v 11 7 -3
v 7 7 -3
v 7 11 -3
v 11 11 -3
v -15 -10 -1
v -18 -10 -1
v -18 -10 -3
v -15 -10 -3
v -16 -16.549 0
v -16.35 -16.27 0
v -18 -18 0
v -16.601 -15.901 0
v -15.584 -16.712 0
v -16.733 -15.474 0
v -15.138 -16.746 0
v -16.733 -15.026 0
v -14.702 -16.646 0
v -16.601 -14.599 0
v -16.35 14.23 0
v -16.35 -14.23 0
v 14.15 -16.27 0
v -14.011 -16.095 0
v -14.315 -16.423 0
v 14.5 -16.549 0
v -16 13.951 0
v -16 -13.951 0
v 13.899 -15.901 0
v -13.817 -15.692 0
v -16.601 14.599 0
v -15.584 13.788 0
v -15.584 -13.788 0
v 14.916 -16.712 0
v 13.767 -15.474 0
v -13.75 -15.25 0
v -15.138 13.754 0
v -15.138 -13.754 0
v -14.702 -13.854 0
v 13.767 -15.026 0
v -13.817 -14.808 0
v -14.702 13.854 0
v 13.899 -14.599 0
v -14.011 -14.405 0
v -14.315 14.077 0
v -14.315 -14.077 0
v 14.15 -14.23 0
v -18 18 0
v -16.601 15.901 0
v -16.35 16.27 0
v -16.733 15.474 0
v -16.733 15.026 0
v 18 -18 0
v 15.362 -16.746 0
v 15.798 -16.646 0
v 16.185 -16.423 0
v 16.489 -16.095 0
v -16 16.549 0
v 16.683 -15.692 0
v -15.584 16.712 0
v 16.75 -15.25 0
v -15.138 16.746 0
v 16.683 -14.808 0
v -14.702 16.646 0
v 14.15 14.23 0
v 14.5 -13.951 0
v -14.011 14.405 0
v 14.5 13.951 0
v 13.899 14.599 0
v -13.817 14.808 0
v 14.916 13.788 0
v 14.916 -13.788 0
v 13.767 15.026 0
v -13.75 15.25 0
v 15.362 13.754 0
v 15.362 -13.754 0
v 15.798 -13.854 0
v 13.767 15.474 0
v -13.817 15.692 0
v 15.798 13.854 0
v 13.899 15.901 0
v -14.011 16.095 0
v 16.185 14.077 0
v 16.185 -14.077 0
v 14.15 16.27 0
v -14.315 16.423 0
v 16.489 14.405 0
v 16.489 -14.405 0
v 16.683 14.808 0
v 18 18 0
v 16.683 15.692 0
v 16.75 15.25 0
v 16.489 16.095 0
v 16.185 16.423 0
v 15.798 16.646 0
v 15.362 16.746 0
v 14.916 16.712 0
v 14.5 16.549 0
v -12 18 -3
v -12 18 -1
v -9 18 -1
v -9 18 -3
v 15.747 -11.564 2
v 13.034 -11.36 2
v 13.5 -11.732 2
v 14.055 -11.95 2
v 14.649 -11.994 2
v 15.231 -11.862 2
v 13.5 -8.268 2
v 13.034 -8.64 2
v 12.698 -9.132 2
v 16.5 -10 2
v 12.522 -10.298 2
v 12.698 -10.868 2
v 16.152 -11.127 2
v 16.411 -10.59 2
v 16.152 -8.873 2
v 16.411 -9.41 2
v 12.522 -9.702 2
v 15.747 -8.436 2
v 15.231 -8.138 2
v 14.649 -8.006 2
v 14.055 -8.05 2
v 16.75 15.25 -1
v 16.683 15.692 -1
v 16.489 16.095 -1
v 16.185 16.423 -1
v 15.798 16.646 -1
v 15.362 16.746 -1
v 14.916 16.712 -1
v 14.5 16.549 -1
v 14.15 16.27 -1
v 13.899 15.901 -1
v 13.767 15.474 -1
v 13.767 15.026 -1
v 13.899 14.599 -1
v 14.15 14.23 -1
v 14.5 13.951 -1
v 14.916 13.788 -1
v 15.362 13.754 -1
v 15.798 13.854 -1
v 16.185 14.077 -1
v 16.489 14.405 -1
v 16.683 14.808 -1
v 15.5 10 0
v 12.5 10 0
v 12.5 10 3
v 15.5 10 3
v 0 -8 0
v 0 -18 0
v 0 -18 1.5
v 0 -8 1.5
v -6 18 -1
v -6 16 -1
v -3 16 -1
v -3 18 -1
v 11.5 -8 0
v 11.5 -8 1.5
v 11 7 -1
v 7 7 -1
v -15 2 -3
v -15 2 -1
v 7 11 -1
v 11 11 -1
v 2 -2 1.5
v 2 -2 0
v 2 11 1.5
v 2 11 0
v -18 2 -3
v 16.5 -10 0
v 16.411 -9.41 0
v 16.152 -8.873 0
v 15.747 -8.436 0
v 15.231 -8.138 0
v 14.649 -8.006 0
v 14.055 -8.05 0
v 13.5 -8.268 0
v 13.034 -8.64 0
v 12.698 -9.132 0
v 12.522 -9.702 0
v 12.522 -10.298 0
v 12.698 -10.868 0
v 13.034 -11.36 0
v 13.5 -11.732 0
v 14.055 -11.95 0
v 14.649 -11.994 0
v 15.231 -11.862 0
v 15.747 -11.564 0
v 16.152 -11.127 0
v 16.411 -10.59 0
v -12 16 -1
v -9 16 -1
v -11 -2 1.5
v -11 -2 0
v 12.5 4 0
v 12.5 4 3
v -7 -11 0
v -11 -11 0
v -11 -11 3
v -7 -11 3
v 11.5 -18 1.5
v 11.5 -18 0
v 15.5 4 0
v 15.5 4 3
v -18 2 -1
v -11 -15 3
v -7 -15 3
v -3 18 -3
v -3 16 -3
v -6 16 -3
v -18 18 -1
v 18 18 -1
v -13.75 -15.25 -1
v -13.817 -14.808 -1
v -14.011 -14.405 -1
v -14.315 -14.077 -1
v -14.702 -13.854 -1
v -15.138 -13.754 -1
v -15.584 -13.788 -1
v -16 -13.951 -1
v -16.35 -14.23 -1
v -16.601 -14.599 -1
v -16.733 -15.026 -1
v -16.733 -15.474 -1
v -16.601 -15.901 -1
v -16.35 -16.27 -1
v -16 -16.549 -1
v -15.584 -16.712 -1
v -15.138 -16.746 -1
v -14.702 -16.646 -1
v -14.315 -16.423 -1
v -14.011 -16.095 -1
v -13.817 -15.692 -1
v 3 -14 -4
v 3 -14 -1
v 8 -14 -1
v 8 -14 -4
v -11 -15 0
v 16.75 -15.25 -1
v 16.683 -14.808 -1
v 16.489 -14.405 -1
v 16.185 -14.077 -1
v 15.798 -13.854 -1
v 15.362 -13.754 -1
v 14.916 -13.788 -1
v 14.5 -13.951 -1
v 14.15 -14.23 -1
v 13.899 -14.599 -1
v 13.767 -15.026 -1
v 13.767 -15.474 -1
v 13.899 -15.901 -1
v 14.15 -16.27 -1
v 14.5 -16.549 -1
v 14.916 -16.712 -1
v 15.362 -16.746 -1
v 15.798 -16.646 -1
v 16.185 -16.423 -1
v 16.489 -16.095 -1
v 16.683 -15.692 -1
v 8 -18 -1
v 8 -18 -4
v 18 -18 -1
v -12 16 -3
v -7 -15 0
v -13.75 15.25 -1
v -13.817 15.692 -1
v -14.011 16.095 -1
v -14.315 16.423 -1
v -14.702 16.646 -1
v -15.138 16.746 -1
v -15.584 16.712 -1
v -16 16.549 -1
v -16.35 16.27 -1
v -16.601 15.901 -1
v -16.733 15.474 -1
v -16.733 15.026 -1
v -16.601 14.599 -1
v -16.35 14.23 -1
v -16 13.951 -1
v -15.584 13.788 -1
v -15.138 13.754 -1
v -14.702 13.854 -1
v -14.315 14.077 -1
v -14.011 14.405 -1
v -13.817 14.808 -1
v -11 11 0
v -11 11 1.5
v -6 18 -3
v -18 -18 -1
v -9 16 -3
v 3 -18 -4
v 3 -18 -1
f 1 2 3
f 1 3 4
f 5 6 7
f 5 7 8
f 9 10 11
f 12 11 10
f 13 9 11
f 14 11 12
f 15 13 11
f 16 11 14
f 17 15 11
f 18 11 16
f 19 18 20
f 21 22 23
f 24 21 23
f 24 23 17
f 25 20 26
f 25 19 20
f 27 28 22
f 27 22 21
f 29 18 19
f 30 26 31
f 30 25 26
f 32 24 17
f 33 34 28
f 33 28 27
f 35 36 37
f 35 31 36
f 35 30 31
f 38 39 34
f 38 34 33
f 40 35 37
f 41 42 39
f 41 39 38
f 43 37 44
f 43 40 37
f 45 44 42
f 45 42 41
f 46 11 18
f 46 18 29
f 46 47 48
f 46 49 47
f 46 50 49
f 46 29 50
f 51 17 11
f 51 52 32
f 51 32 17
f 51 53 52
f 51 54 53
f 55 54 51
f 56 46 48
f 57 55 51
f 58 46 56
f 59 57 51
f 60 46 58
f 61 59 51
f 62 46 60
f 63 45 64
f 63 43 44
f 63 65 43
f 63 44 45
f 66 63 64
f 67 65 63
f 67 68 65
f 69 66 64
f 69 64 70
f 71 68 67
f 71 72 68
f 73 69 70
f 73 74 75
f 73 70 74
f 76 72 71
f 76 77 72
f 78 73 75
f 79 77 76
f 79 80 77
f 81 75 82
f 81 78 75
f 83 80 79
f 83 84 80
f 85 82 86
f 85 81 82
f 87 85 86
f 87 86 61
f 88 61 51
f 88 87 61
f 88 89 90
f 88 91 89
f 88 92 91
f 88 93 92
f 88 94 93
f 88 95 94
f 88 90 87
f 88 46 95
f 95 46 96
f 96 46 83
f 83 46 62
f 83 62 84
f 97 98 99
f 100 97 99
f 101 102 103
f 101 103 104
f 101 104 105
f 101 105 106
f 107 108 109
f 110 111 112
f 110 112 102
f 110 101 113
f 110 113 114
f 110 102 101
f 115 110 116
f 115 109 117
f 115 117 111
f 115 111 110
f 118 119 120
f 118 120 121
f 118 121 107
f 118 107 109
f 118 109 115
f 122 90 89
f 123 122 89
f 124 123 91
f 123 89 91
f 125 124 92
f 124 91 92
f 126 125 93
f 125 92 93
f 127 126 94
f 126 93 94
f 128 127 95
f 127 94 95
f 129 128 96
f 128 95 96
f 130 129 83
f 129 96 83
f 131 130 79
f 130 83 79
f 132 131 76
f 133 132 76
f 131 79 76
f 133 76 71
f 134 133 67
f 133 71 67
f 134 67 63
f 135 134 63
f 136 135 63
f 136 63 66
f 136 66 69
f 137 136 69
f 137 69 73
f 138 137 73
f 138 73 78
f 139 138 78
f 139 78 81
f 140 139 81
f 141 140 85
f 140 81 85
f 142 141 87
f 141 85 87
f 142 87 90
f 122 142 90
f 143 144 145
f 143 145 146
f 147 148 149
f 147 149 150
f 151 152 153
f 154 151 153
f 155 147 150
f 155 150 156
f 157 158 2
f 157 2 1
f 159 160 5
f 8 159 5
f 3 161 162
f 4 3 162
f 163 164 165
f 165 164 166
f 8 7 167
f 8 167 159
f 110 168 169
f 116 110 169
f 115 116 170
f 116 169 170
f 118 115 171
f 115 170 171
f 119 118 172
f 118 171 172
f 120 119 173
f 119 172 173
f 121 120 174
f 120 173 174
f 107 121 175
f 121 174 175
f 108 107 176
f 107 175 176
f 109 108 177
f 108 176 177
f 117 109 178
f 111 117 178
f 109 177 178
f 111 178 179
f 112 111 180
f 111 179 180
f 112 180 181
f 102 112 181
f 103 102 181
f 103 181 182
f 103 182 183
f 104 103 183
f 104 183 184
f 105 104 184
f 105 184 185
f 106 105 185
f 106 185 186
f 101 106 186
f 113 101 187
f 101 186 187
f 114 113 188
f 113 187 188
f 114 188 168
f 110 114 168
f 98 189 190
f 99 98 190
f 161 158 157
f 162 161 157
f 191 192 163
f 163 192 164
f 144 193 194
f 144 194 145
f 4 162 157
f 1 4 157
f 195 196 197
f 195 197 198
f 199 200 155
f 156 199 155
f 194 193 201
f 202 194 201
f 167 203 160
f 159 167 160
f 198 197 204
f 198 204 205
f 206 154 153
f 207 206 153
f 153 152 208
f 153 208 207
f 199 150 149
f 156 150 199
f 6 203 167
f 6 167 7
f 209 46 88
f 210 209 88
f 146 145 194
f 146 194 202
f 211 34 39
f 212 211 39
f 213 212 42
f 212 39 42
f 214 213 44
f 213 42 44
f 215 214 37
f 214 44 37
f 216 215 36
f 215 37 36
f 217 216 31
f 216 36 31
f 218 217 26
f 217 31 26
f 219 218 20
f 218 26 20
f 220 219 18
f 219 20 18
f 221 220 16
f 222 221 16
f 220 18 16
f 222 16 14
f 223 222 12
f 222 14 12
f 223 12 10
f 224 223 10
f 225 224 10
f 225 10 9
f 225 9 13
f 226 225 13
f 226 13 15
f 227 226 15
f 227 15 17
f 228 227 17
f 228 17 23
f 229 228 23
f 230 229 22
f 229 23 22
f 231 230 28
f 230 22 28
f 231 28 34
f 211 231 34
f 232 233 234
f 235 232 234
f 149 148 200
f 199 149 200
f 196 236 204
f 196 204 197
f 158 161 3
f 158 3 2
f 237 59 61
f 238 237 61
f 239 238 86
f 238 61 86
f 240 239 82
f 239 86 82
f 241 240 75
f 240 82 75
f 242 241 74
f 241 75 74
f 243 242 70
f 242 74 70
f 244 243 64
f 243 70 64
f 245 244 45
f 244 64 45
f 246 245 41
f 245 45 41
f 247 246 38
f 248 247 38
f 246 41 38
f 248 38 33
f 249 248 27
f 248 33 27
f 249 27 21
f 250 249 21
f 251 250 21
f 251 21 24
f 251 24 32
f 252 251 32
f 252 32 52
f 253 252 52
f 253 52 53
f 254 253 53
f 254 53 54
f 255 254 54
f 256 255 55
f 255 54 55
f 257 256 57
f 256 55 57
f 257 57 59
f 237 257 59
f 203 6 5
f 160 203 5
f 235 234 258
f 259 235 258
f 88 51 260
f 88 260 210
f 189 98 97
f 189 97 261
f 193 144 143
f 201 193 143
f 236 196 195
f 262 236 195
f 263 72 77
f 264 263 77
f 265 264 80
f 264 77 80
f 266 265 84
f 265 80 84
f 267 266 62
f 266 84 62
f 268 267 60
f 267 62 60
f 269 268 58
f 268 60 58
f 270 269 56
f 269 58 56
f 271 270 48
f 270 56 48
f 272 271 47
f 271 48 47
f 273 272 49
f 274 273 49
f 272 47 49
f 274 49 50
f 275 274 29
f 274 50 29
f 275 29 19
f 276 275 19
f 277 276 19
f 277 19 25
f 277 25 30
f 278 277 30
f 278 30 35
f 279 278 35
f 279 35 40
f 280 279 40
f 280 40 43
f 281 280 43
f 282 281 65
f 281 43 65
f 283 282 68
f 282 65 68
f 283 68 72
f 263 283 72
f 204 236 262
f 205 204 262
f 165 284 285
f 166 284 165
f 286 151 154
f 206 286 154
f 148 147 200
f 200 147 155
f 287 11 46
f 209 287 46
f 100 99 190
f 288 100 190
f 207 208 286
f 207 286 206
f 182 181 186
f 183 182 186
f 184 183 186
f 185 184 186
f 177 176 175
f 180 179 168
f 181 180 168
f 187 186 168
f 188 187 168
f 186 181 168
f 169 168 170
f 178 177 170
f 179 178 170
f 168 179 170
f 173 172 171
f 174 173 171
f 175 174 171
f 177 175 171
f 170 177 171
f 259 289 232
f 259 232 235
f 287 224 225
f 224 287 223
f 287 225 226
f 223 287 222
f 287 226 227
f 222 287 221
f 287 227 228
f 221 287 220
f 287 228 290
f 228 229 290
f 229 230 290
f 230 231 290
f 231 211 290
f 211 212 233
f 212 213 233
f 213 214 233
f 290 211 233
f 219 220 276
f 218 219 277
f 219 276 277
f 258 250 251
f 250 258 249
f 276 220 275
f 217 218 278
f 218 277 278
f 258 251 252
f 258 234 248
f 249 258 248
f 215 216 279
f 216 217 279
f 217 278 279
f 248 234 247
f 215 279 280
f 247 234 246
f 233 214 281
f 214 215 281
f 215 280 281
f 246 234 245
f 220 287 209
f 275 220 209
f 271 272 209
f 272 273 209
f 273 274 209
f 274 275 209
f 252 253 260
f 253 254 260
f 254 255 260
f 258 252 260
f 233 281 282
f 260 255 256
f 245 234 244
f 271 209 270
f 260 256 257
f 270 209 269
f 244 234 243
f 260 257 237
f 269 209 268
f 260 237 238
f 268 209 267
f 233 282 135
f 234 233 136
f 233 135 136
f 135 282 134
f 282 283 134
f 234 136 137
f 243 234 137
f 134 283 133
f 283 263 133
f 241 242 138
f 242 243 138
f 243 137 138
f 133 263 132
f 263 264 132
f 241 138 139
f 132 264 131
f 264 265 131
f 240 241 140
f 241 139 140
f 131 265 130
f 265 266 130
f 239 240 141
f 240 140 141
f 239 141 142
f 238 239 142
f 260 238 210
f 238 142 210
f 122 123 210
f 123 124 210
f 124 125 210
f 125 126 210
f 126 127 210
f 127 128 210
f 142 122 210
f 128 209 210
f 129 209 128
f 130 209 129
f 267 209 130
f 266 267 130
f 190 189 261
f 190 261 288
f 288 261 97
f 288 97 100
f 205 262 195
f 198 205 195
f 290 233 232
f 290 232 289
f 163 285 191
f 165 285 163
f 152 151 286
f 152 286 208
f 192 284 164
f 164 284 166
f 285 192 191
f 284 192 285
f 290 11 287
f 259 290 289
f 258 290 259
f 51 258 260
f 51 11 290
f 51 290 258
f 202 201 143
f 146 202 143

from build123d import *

# Parameters (mm, degrees)
F1_W     = 13
F1_H     = 13
F1_W_2   = 11.5
F1_H_2   = 10
F2_DEPTH = 1.5
F1_R     = 2
F3_DEPTH = 2
F1_W_3   = 3
F1_H_3   = 6
F1_W_4   = 4
F1_H_4   = 4
F4_DEPTH = 3
F0_W     = 36
F0_H     = 36
F0_R     = 1.5
F5_DEPTH = 1
F6_W     = 3
F6_H     = 2
F6_W_2   = 4
F6_H_2   = 4
F6_H_3   = 12
F7_DEPTH = 2
F6_W_3   = 5
F8_DEPTH = 3


with BuildPart() as f2:
    # F1 (on face) → F2 (new body)
    with BuildSketch(Plane.XY):
        with Locations((-4.5, 4.5)):
            Rectangle(F1_W, F1_H)
        with Locations((5.75, -13)):
            Rectangle(F1_W_2, F1_H_2)
    extrude(amount=F2_DEPTH)


with BuildPart() as f3:
    # F1 (on face) → F3 (new body)
    with BuildSketch(Plane.XY):
        with Locations((14.5, -10)):
            Circle(F1_R)
    extrude(amount=F3_DEPTH)


with BuildPart() as f4:
    # F1 (on face) → F4 (new body)
    with BuildSketch(Plane.XY):
        with Locations((14, 7)):
            Rectangle(F1_W_3, F1_H_3)
        with Locations((-9, -13)):
            Rectangle(F1_W_4, F1_H_4)
    extrude(amount=F4_DEPTH)


with BuildPart() as f5:
    # F0 (on Top) → F5 (new body)
    with BuildSketch(Plane.XY):
        Rectangle(F0_W, F0_H)
        with Locations((-15.25, -15.25)):
            Circle(F0_R, mode=Mode.SUBTRACT)
        with Locations((15.25, -15.25)):
            Circle(F0_R, mode=Mode.SUBTRACT)
        with Locations((-15.25, 15.25)):
            Circle(F0_R, mode=Mode.SUBTRACT)
        with Locations((15.25, 15.25)):
            Circle(F0_R, mode=Mode.SUBTRACT)
    extrude(amount=-F5_DEPTH)

    # F6 (on face) → F8 (join)
    with BuildSketch(Plane(origin=(0, 0, -1), x_dir=(1, 0, 0), z_dir=(0, 0, -1))):
        with Locations((5.5, 16)):
            Rectangle(F6_W_3, F6_H_2)
    extrude(amount=F8_DEPTH)


with BuildPart() as f7:
    # F6 (on face) → F7 (new body)
    with BuildSketch(Plane(origin=(0, 0, -1), x_dir=(1, 0, 0), z_dir=(0, 0, -1))):
        with Locations((-4.5, -17)):
            Rectangle(F6_W, F6_H)
        with Locations((-10.5, -17)):
            Rectangle(F6_W, F6_H)
        with Locations((9, -9)):
            Rectangle(F6_W_2, F6_H_2)
        with Locations((-16.5, 4)):
            Rectangle(F6_W, F6_H_3)
    extrude(amount=F7_DEPTH)


solid = Compound([f2.part, f3.part, f4.part, f5.part, f7.part])
